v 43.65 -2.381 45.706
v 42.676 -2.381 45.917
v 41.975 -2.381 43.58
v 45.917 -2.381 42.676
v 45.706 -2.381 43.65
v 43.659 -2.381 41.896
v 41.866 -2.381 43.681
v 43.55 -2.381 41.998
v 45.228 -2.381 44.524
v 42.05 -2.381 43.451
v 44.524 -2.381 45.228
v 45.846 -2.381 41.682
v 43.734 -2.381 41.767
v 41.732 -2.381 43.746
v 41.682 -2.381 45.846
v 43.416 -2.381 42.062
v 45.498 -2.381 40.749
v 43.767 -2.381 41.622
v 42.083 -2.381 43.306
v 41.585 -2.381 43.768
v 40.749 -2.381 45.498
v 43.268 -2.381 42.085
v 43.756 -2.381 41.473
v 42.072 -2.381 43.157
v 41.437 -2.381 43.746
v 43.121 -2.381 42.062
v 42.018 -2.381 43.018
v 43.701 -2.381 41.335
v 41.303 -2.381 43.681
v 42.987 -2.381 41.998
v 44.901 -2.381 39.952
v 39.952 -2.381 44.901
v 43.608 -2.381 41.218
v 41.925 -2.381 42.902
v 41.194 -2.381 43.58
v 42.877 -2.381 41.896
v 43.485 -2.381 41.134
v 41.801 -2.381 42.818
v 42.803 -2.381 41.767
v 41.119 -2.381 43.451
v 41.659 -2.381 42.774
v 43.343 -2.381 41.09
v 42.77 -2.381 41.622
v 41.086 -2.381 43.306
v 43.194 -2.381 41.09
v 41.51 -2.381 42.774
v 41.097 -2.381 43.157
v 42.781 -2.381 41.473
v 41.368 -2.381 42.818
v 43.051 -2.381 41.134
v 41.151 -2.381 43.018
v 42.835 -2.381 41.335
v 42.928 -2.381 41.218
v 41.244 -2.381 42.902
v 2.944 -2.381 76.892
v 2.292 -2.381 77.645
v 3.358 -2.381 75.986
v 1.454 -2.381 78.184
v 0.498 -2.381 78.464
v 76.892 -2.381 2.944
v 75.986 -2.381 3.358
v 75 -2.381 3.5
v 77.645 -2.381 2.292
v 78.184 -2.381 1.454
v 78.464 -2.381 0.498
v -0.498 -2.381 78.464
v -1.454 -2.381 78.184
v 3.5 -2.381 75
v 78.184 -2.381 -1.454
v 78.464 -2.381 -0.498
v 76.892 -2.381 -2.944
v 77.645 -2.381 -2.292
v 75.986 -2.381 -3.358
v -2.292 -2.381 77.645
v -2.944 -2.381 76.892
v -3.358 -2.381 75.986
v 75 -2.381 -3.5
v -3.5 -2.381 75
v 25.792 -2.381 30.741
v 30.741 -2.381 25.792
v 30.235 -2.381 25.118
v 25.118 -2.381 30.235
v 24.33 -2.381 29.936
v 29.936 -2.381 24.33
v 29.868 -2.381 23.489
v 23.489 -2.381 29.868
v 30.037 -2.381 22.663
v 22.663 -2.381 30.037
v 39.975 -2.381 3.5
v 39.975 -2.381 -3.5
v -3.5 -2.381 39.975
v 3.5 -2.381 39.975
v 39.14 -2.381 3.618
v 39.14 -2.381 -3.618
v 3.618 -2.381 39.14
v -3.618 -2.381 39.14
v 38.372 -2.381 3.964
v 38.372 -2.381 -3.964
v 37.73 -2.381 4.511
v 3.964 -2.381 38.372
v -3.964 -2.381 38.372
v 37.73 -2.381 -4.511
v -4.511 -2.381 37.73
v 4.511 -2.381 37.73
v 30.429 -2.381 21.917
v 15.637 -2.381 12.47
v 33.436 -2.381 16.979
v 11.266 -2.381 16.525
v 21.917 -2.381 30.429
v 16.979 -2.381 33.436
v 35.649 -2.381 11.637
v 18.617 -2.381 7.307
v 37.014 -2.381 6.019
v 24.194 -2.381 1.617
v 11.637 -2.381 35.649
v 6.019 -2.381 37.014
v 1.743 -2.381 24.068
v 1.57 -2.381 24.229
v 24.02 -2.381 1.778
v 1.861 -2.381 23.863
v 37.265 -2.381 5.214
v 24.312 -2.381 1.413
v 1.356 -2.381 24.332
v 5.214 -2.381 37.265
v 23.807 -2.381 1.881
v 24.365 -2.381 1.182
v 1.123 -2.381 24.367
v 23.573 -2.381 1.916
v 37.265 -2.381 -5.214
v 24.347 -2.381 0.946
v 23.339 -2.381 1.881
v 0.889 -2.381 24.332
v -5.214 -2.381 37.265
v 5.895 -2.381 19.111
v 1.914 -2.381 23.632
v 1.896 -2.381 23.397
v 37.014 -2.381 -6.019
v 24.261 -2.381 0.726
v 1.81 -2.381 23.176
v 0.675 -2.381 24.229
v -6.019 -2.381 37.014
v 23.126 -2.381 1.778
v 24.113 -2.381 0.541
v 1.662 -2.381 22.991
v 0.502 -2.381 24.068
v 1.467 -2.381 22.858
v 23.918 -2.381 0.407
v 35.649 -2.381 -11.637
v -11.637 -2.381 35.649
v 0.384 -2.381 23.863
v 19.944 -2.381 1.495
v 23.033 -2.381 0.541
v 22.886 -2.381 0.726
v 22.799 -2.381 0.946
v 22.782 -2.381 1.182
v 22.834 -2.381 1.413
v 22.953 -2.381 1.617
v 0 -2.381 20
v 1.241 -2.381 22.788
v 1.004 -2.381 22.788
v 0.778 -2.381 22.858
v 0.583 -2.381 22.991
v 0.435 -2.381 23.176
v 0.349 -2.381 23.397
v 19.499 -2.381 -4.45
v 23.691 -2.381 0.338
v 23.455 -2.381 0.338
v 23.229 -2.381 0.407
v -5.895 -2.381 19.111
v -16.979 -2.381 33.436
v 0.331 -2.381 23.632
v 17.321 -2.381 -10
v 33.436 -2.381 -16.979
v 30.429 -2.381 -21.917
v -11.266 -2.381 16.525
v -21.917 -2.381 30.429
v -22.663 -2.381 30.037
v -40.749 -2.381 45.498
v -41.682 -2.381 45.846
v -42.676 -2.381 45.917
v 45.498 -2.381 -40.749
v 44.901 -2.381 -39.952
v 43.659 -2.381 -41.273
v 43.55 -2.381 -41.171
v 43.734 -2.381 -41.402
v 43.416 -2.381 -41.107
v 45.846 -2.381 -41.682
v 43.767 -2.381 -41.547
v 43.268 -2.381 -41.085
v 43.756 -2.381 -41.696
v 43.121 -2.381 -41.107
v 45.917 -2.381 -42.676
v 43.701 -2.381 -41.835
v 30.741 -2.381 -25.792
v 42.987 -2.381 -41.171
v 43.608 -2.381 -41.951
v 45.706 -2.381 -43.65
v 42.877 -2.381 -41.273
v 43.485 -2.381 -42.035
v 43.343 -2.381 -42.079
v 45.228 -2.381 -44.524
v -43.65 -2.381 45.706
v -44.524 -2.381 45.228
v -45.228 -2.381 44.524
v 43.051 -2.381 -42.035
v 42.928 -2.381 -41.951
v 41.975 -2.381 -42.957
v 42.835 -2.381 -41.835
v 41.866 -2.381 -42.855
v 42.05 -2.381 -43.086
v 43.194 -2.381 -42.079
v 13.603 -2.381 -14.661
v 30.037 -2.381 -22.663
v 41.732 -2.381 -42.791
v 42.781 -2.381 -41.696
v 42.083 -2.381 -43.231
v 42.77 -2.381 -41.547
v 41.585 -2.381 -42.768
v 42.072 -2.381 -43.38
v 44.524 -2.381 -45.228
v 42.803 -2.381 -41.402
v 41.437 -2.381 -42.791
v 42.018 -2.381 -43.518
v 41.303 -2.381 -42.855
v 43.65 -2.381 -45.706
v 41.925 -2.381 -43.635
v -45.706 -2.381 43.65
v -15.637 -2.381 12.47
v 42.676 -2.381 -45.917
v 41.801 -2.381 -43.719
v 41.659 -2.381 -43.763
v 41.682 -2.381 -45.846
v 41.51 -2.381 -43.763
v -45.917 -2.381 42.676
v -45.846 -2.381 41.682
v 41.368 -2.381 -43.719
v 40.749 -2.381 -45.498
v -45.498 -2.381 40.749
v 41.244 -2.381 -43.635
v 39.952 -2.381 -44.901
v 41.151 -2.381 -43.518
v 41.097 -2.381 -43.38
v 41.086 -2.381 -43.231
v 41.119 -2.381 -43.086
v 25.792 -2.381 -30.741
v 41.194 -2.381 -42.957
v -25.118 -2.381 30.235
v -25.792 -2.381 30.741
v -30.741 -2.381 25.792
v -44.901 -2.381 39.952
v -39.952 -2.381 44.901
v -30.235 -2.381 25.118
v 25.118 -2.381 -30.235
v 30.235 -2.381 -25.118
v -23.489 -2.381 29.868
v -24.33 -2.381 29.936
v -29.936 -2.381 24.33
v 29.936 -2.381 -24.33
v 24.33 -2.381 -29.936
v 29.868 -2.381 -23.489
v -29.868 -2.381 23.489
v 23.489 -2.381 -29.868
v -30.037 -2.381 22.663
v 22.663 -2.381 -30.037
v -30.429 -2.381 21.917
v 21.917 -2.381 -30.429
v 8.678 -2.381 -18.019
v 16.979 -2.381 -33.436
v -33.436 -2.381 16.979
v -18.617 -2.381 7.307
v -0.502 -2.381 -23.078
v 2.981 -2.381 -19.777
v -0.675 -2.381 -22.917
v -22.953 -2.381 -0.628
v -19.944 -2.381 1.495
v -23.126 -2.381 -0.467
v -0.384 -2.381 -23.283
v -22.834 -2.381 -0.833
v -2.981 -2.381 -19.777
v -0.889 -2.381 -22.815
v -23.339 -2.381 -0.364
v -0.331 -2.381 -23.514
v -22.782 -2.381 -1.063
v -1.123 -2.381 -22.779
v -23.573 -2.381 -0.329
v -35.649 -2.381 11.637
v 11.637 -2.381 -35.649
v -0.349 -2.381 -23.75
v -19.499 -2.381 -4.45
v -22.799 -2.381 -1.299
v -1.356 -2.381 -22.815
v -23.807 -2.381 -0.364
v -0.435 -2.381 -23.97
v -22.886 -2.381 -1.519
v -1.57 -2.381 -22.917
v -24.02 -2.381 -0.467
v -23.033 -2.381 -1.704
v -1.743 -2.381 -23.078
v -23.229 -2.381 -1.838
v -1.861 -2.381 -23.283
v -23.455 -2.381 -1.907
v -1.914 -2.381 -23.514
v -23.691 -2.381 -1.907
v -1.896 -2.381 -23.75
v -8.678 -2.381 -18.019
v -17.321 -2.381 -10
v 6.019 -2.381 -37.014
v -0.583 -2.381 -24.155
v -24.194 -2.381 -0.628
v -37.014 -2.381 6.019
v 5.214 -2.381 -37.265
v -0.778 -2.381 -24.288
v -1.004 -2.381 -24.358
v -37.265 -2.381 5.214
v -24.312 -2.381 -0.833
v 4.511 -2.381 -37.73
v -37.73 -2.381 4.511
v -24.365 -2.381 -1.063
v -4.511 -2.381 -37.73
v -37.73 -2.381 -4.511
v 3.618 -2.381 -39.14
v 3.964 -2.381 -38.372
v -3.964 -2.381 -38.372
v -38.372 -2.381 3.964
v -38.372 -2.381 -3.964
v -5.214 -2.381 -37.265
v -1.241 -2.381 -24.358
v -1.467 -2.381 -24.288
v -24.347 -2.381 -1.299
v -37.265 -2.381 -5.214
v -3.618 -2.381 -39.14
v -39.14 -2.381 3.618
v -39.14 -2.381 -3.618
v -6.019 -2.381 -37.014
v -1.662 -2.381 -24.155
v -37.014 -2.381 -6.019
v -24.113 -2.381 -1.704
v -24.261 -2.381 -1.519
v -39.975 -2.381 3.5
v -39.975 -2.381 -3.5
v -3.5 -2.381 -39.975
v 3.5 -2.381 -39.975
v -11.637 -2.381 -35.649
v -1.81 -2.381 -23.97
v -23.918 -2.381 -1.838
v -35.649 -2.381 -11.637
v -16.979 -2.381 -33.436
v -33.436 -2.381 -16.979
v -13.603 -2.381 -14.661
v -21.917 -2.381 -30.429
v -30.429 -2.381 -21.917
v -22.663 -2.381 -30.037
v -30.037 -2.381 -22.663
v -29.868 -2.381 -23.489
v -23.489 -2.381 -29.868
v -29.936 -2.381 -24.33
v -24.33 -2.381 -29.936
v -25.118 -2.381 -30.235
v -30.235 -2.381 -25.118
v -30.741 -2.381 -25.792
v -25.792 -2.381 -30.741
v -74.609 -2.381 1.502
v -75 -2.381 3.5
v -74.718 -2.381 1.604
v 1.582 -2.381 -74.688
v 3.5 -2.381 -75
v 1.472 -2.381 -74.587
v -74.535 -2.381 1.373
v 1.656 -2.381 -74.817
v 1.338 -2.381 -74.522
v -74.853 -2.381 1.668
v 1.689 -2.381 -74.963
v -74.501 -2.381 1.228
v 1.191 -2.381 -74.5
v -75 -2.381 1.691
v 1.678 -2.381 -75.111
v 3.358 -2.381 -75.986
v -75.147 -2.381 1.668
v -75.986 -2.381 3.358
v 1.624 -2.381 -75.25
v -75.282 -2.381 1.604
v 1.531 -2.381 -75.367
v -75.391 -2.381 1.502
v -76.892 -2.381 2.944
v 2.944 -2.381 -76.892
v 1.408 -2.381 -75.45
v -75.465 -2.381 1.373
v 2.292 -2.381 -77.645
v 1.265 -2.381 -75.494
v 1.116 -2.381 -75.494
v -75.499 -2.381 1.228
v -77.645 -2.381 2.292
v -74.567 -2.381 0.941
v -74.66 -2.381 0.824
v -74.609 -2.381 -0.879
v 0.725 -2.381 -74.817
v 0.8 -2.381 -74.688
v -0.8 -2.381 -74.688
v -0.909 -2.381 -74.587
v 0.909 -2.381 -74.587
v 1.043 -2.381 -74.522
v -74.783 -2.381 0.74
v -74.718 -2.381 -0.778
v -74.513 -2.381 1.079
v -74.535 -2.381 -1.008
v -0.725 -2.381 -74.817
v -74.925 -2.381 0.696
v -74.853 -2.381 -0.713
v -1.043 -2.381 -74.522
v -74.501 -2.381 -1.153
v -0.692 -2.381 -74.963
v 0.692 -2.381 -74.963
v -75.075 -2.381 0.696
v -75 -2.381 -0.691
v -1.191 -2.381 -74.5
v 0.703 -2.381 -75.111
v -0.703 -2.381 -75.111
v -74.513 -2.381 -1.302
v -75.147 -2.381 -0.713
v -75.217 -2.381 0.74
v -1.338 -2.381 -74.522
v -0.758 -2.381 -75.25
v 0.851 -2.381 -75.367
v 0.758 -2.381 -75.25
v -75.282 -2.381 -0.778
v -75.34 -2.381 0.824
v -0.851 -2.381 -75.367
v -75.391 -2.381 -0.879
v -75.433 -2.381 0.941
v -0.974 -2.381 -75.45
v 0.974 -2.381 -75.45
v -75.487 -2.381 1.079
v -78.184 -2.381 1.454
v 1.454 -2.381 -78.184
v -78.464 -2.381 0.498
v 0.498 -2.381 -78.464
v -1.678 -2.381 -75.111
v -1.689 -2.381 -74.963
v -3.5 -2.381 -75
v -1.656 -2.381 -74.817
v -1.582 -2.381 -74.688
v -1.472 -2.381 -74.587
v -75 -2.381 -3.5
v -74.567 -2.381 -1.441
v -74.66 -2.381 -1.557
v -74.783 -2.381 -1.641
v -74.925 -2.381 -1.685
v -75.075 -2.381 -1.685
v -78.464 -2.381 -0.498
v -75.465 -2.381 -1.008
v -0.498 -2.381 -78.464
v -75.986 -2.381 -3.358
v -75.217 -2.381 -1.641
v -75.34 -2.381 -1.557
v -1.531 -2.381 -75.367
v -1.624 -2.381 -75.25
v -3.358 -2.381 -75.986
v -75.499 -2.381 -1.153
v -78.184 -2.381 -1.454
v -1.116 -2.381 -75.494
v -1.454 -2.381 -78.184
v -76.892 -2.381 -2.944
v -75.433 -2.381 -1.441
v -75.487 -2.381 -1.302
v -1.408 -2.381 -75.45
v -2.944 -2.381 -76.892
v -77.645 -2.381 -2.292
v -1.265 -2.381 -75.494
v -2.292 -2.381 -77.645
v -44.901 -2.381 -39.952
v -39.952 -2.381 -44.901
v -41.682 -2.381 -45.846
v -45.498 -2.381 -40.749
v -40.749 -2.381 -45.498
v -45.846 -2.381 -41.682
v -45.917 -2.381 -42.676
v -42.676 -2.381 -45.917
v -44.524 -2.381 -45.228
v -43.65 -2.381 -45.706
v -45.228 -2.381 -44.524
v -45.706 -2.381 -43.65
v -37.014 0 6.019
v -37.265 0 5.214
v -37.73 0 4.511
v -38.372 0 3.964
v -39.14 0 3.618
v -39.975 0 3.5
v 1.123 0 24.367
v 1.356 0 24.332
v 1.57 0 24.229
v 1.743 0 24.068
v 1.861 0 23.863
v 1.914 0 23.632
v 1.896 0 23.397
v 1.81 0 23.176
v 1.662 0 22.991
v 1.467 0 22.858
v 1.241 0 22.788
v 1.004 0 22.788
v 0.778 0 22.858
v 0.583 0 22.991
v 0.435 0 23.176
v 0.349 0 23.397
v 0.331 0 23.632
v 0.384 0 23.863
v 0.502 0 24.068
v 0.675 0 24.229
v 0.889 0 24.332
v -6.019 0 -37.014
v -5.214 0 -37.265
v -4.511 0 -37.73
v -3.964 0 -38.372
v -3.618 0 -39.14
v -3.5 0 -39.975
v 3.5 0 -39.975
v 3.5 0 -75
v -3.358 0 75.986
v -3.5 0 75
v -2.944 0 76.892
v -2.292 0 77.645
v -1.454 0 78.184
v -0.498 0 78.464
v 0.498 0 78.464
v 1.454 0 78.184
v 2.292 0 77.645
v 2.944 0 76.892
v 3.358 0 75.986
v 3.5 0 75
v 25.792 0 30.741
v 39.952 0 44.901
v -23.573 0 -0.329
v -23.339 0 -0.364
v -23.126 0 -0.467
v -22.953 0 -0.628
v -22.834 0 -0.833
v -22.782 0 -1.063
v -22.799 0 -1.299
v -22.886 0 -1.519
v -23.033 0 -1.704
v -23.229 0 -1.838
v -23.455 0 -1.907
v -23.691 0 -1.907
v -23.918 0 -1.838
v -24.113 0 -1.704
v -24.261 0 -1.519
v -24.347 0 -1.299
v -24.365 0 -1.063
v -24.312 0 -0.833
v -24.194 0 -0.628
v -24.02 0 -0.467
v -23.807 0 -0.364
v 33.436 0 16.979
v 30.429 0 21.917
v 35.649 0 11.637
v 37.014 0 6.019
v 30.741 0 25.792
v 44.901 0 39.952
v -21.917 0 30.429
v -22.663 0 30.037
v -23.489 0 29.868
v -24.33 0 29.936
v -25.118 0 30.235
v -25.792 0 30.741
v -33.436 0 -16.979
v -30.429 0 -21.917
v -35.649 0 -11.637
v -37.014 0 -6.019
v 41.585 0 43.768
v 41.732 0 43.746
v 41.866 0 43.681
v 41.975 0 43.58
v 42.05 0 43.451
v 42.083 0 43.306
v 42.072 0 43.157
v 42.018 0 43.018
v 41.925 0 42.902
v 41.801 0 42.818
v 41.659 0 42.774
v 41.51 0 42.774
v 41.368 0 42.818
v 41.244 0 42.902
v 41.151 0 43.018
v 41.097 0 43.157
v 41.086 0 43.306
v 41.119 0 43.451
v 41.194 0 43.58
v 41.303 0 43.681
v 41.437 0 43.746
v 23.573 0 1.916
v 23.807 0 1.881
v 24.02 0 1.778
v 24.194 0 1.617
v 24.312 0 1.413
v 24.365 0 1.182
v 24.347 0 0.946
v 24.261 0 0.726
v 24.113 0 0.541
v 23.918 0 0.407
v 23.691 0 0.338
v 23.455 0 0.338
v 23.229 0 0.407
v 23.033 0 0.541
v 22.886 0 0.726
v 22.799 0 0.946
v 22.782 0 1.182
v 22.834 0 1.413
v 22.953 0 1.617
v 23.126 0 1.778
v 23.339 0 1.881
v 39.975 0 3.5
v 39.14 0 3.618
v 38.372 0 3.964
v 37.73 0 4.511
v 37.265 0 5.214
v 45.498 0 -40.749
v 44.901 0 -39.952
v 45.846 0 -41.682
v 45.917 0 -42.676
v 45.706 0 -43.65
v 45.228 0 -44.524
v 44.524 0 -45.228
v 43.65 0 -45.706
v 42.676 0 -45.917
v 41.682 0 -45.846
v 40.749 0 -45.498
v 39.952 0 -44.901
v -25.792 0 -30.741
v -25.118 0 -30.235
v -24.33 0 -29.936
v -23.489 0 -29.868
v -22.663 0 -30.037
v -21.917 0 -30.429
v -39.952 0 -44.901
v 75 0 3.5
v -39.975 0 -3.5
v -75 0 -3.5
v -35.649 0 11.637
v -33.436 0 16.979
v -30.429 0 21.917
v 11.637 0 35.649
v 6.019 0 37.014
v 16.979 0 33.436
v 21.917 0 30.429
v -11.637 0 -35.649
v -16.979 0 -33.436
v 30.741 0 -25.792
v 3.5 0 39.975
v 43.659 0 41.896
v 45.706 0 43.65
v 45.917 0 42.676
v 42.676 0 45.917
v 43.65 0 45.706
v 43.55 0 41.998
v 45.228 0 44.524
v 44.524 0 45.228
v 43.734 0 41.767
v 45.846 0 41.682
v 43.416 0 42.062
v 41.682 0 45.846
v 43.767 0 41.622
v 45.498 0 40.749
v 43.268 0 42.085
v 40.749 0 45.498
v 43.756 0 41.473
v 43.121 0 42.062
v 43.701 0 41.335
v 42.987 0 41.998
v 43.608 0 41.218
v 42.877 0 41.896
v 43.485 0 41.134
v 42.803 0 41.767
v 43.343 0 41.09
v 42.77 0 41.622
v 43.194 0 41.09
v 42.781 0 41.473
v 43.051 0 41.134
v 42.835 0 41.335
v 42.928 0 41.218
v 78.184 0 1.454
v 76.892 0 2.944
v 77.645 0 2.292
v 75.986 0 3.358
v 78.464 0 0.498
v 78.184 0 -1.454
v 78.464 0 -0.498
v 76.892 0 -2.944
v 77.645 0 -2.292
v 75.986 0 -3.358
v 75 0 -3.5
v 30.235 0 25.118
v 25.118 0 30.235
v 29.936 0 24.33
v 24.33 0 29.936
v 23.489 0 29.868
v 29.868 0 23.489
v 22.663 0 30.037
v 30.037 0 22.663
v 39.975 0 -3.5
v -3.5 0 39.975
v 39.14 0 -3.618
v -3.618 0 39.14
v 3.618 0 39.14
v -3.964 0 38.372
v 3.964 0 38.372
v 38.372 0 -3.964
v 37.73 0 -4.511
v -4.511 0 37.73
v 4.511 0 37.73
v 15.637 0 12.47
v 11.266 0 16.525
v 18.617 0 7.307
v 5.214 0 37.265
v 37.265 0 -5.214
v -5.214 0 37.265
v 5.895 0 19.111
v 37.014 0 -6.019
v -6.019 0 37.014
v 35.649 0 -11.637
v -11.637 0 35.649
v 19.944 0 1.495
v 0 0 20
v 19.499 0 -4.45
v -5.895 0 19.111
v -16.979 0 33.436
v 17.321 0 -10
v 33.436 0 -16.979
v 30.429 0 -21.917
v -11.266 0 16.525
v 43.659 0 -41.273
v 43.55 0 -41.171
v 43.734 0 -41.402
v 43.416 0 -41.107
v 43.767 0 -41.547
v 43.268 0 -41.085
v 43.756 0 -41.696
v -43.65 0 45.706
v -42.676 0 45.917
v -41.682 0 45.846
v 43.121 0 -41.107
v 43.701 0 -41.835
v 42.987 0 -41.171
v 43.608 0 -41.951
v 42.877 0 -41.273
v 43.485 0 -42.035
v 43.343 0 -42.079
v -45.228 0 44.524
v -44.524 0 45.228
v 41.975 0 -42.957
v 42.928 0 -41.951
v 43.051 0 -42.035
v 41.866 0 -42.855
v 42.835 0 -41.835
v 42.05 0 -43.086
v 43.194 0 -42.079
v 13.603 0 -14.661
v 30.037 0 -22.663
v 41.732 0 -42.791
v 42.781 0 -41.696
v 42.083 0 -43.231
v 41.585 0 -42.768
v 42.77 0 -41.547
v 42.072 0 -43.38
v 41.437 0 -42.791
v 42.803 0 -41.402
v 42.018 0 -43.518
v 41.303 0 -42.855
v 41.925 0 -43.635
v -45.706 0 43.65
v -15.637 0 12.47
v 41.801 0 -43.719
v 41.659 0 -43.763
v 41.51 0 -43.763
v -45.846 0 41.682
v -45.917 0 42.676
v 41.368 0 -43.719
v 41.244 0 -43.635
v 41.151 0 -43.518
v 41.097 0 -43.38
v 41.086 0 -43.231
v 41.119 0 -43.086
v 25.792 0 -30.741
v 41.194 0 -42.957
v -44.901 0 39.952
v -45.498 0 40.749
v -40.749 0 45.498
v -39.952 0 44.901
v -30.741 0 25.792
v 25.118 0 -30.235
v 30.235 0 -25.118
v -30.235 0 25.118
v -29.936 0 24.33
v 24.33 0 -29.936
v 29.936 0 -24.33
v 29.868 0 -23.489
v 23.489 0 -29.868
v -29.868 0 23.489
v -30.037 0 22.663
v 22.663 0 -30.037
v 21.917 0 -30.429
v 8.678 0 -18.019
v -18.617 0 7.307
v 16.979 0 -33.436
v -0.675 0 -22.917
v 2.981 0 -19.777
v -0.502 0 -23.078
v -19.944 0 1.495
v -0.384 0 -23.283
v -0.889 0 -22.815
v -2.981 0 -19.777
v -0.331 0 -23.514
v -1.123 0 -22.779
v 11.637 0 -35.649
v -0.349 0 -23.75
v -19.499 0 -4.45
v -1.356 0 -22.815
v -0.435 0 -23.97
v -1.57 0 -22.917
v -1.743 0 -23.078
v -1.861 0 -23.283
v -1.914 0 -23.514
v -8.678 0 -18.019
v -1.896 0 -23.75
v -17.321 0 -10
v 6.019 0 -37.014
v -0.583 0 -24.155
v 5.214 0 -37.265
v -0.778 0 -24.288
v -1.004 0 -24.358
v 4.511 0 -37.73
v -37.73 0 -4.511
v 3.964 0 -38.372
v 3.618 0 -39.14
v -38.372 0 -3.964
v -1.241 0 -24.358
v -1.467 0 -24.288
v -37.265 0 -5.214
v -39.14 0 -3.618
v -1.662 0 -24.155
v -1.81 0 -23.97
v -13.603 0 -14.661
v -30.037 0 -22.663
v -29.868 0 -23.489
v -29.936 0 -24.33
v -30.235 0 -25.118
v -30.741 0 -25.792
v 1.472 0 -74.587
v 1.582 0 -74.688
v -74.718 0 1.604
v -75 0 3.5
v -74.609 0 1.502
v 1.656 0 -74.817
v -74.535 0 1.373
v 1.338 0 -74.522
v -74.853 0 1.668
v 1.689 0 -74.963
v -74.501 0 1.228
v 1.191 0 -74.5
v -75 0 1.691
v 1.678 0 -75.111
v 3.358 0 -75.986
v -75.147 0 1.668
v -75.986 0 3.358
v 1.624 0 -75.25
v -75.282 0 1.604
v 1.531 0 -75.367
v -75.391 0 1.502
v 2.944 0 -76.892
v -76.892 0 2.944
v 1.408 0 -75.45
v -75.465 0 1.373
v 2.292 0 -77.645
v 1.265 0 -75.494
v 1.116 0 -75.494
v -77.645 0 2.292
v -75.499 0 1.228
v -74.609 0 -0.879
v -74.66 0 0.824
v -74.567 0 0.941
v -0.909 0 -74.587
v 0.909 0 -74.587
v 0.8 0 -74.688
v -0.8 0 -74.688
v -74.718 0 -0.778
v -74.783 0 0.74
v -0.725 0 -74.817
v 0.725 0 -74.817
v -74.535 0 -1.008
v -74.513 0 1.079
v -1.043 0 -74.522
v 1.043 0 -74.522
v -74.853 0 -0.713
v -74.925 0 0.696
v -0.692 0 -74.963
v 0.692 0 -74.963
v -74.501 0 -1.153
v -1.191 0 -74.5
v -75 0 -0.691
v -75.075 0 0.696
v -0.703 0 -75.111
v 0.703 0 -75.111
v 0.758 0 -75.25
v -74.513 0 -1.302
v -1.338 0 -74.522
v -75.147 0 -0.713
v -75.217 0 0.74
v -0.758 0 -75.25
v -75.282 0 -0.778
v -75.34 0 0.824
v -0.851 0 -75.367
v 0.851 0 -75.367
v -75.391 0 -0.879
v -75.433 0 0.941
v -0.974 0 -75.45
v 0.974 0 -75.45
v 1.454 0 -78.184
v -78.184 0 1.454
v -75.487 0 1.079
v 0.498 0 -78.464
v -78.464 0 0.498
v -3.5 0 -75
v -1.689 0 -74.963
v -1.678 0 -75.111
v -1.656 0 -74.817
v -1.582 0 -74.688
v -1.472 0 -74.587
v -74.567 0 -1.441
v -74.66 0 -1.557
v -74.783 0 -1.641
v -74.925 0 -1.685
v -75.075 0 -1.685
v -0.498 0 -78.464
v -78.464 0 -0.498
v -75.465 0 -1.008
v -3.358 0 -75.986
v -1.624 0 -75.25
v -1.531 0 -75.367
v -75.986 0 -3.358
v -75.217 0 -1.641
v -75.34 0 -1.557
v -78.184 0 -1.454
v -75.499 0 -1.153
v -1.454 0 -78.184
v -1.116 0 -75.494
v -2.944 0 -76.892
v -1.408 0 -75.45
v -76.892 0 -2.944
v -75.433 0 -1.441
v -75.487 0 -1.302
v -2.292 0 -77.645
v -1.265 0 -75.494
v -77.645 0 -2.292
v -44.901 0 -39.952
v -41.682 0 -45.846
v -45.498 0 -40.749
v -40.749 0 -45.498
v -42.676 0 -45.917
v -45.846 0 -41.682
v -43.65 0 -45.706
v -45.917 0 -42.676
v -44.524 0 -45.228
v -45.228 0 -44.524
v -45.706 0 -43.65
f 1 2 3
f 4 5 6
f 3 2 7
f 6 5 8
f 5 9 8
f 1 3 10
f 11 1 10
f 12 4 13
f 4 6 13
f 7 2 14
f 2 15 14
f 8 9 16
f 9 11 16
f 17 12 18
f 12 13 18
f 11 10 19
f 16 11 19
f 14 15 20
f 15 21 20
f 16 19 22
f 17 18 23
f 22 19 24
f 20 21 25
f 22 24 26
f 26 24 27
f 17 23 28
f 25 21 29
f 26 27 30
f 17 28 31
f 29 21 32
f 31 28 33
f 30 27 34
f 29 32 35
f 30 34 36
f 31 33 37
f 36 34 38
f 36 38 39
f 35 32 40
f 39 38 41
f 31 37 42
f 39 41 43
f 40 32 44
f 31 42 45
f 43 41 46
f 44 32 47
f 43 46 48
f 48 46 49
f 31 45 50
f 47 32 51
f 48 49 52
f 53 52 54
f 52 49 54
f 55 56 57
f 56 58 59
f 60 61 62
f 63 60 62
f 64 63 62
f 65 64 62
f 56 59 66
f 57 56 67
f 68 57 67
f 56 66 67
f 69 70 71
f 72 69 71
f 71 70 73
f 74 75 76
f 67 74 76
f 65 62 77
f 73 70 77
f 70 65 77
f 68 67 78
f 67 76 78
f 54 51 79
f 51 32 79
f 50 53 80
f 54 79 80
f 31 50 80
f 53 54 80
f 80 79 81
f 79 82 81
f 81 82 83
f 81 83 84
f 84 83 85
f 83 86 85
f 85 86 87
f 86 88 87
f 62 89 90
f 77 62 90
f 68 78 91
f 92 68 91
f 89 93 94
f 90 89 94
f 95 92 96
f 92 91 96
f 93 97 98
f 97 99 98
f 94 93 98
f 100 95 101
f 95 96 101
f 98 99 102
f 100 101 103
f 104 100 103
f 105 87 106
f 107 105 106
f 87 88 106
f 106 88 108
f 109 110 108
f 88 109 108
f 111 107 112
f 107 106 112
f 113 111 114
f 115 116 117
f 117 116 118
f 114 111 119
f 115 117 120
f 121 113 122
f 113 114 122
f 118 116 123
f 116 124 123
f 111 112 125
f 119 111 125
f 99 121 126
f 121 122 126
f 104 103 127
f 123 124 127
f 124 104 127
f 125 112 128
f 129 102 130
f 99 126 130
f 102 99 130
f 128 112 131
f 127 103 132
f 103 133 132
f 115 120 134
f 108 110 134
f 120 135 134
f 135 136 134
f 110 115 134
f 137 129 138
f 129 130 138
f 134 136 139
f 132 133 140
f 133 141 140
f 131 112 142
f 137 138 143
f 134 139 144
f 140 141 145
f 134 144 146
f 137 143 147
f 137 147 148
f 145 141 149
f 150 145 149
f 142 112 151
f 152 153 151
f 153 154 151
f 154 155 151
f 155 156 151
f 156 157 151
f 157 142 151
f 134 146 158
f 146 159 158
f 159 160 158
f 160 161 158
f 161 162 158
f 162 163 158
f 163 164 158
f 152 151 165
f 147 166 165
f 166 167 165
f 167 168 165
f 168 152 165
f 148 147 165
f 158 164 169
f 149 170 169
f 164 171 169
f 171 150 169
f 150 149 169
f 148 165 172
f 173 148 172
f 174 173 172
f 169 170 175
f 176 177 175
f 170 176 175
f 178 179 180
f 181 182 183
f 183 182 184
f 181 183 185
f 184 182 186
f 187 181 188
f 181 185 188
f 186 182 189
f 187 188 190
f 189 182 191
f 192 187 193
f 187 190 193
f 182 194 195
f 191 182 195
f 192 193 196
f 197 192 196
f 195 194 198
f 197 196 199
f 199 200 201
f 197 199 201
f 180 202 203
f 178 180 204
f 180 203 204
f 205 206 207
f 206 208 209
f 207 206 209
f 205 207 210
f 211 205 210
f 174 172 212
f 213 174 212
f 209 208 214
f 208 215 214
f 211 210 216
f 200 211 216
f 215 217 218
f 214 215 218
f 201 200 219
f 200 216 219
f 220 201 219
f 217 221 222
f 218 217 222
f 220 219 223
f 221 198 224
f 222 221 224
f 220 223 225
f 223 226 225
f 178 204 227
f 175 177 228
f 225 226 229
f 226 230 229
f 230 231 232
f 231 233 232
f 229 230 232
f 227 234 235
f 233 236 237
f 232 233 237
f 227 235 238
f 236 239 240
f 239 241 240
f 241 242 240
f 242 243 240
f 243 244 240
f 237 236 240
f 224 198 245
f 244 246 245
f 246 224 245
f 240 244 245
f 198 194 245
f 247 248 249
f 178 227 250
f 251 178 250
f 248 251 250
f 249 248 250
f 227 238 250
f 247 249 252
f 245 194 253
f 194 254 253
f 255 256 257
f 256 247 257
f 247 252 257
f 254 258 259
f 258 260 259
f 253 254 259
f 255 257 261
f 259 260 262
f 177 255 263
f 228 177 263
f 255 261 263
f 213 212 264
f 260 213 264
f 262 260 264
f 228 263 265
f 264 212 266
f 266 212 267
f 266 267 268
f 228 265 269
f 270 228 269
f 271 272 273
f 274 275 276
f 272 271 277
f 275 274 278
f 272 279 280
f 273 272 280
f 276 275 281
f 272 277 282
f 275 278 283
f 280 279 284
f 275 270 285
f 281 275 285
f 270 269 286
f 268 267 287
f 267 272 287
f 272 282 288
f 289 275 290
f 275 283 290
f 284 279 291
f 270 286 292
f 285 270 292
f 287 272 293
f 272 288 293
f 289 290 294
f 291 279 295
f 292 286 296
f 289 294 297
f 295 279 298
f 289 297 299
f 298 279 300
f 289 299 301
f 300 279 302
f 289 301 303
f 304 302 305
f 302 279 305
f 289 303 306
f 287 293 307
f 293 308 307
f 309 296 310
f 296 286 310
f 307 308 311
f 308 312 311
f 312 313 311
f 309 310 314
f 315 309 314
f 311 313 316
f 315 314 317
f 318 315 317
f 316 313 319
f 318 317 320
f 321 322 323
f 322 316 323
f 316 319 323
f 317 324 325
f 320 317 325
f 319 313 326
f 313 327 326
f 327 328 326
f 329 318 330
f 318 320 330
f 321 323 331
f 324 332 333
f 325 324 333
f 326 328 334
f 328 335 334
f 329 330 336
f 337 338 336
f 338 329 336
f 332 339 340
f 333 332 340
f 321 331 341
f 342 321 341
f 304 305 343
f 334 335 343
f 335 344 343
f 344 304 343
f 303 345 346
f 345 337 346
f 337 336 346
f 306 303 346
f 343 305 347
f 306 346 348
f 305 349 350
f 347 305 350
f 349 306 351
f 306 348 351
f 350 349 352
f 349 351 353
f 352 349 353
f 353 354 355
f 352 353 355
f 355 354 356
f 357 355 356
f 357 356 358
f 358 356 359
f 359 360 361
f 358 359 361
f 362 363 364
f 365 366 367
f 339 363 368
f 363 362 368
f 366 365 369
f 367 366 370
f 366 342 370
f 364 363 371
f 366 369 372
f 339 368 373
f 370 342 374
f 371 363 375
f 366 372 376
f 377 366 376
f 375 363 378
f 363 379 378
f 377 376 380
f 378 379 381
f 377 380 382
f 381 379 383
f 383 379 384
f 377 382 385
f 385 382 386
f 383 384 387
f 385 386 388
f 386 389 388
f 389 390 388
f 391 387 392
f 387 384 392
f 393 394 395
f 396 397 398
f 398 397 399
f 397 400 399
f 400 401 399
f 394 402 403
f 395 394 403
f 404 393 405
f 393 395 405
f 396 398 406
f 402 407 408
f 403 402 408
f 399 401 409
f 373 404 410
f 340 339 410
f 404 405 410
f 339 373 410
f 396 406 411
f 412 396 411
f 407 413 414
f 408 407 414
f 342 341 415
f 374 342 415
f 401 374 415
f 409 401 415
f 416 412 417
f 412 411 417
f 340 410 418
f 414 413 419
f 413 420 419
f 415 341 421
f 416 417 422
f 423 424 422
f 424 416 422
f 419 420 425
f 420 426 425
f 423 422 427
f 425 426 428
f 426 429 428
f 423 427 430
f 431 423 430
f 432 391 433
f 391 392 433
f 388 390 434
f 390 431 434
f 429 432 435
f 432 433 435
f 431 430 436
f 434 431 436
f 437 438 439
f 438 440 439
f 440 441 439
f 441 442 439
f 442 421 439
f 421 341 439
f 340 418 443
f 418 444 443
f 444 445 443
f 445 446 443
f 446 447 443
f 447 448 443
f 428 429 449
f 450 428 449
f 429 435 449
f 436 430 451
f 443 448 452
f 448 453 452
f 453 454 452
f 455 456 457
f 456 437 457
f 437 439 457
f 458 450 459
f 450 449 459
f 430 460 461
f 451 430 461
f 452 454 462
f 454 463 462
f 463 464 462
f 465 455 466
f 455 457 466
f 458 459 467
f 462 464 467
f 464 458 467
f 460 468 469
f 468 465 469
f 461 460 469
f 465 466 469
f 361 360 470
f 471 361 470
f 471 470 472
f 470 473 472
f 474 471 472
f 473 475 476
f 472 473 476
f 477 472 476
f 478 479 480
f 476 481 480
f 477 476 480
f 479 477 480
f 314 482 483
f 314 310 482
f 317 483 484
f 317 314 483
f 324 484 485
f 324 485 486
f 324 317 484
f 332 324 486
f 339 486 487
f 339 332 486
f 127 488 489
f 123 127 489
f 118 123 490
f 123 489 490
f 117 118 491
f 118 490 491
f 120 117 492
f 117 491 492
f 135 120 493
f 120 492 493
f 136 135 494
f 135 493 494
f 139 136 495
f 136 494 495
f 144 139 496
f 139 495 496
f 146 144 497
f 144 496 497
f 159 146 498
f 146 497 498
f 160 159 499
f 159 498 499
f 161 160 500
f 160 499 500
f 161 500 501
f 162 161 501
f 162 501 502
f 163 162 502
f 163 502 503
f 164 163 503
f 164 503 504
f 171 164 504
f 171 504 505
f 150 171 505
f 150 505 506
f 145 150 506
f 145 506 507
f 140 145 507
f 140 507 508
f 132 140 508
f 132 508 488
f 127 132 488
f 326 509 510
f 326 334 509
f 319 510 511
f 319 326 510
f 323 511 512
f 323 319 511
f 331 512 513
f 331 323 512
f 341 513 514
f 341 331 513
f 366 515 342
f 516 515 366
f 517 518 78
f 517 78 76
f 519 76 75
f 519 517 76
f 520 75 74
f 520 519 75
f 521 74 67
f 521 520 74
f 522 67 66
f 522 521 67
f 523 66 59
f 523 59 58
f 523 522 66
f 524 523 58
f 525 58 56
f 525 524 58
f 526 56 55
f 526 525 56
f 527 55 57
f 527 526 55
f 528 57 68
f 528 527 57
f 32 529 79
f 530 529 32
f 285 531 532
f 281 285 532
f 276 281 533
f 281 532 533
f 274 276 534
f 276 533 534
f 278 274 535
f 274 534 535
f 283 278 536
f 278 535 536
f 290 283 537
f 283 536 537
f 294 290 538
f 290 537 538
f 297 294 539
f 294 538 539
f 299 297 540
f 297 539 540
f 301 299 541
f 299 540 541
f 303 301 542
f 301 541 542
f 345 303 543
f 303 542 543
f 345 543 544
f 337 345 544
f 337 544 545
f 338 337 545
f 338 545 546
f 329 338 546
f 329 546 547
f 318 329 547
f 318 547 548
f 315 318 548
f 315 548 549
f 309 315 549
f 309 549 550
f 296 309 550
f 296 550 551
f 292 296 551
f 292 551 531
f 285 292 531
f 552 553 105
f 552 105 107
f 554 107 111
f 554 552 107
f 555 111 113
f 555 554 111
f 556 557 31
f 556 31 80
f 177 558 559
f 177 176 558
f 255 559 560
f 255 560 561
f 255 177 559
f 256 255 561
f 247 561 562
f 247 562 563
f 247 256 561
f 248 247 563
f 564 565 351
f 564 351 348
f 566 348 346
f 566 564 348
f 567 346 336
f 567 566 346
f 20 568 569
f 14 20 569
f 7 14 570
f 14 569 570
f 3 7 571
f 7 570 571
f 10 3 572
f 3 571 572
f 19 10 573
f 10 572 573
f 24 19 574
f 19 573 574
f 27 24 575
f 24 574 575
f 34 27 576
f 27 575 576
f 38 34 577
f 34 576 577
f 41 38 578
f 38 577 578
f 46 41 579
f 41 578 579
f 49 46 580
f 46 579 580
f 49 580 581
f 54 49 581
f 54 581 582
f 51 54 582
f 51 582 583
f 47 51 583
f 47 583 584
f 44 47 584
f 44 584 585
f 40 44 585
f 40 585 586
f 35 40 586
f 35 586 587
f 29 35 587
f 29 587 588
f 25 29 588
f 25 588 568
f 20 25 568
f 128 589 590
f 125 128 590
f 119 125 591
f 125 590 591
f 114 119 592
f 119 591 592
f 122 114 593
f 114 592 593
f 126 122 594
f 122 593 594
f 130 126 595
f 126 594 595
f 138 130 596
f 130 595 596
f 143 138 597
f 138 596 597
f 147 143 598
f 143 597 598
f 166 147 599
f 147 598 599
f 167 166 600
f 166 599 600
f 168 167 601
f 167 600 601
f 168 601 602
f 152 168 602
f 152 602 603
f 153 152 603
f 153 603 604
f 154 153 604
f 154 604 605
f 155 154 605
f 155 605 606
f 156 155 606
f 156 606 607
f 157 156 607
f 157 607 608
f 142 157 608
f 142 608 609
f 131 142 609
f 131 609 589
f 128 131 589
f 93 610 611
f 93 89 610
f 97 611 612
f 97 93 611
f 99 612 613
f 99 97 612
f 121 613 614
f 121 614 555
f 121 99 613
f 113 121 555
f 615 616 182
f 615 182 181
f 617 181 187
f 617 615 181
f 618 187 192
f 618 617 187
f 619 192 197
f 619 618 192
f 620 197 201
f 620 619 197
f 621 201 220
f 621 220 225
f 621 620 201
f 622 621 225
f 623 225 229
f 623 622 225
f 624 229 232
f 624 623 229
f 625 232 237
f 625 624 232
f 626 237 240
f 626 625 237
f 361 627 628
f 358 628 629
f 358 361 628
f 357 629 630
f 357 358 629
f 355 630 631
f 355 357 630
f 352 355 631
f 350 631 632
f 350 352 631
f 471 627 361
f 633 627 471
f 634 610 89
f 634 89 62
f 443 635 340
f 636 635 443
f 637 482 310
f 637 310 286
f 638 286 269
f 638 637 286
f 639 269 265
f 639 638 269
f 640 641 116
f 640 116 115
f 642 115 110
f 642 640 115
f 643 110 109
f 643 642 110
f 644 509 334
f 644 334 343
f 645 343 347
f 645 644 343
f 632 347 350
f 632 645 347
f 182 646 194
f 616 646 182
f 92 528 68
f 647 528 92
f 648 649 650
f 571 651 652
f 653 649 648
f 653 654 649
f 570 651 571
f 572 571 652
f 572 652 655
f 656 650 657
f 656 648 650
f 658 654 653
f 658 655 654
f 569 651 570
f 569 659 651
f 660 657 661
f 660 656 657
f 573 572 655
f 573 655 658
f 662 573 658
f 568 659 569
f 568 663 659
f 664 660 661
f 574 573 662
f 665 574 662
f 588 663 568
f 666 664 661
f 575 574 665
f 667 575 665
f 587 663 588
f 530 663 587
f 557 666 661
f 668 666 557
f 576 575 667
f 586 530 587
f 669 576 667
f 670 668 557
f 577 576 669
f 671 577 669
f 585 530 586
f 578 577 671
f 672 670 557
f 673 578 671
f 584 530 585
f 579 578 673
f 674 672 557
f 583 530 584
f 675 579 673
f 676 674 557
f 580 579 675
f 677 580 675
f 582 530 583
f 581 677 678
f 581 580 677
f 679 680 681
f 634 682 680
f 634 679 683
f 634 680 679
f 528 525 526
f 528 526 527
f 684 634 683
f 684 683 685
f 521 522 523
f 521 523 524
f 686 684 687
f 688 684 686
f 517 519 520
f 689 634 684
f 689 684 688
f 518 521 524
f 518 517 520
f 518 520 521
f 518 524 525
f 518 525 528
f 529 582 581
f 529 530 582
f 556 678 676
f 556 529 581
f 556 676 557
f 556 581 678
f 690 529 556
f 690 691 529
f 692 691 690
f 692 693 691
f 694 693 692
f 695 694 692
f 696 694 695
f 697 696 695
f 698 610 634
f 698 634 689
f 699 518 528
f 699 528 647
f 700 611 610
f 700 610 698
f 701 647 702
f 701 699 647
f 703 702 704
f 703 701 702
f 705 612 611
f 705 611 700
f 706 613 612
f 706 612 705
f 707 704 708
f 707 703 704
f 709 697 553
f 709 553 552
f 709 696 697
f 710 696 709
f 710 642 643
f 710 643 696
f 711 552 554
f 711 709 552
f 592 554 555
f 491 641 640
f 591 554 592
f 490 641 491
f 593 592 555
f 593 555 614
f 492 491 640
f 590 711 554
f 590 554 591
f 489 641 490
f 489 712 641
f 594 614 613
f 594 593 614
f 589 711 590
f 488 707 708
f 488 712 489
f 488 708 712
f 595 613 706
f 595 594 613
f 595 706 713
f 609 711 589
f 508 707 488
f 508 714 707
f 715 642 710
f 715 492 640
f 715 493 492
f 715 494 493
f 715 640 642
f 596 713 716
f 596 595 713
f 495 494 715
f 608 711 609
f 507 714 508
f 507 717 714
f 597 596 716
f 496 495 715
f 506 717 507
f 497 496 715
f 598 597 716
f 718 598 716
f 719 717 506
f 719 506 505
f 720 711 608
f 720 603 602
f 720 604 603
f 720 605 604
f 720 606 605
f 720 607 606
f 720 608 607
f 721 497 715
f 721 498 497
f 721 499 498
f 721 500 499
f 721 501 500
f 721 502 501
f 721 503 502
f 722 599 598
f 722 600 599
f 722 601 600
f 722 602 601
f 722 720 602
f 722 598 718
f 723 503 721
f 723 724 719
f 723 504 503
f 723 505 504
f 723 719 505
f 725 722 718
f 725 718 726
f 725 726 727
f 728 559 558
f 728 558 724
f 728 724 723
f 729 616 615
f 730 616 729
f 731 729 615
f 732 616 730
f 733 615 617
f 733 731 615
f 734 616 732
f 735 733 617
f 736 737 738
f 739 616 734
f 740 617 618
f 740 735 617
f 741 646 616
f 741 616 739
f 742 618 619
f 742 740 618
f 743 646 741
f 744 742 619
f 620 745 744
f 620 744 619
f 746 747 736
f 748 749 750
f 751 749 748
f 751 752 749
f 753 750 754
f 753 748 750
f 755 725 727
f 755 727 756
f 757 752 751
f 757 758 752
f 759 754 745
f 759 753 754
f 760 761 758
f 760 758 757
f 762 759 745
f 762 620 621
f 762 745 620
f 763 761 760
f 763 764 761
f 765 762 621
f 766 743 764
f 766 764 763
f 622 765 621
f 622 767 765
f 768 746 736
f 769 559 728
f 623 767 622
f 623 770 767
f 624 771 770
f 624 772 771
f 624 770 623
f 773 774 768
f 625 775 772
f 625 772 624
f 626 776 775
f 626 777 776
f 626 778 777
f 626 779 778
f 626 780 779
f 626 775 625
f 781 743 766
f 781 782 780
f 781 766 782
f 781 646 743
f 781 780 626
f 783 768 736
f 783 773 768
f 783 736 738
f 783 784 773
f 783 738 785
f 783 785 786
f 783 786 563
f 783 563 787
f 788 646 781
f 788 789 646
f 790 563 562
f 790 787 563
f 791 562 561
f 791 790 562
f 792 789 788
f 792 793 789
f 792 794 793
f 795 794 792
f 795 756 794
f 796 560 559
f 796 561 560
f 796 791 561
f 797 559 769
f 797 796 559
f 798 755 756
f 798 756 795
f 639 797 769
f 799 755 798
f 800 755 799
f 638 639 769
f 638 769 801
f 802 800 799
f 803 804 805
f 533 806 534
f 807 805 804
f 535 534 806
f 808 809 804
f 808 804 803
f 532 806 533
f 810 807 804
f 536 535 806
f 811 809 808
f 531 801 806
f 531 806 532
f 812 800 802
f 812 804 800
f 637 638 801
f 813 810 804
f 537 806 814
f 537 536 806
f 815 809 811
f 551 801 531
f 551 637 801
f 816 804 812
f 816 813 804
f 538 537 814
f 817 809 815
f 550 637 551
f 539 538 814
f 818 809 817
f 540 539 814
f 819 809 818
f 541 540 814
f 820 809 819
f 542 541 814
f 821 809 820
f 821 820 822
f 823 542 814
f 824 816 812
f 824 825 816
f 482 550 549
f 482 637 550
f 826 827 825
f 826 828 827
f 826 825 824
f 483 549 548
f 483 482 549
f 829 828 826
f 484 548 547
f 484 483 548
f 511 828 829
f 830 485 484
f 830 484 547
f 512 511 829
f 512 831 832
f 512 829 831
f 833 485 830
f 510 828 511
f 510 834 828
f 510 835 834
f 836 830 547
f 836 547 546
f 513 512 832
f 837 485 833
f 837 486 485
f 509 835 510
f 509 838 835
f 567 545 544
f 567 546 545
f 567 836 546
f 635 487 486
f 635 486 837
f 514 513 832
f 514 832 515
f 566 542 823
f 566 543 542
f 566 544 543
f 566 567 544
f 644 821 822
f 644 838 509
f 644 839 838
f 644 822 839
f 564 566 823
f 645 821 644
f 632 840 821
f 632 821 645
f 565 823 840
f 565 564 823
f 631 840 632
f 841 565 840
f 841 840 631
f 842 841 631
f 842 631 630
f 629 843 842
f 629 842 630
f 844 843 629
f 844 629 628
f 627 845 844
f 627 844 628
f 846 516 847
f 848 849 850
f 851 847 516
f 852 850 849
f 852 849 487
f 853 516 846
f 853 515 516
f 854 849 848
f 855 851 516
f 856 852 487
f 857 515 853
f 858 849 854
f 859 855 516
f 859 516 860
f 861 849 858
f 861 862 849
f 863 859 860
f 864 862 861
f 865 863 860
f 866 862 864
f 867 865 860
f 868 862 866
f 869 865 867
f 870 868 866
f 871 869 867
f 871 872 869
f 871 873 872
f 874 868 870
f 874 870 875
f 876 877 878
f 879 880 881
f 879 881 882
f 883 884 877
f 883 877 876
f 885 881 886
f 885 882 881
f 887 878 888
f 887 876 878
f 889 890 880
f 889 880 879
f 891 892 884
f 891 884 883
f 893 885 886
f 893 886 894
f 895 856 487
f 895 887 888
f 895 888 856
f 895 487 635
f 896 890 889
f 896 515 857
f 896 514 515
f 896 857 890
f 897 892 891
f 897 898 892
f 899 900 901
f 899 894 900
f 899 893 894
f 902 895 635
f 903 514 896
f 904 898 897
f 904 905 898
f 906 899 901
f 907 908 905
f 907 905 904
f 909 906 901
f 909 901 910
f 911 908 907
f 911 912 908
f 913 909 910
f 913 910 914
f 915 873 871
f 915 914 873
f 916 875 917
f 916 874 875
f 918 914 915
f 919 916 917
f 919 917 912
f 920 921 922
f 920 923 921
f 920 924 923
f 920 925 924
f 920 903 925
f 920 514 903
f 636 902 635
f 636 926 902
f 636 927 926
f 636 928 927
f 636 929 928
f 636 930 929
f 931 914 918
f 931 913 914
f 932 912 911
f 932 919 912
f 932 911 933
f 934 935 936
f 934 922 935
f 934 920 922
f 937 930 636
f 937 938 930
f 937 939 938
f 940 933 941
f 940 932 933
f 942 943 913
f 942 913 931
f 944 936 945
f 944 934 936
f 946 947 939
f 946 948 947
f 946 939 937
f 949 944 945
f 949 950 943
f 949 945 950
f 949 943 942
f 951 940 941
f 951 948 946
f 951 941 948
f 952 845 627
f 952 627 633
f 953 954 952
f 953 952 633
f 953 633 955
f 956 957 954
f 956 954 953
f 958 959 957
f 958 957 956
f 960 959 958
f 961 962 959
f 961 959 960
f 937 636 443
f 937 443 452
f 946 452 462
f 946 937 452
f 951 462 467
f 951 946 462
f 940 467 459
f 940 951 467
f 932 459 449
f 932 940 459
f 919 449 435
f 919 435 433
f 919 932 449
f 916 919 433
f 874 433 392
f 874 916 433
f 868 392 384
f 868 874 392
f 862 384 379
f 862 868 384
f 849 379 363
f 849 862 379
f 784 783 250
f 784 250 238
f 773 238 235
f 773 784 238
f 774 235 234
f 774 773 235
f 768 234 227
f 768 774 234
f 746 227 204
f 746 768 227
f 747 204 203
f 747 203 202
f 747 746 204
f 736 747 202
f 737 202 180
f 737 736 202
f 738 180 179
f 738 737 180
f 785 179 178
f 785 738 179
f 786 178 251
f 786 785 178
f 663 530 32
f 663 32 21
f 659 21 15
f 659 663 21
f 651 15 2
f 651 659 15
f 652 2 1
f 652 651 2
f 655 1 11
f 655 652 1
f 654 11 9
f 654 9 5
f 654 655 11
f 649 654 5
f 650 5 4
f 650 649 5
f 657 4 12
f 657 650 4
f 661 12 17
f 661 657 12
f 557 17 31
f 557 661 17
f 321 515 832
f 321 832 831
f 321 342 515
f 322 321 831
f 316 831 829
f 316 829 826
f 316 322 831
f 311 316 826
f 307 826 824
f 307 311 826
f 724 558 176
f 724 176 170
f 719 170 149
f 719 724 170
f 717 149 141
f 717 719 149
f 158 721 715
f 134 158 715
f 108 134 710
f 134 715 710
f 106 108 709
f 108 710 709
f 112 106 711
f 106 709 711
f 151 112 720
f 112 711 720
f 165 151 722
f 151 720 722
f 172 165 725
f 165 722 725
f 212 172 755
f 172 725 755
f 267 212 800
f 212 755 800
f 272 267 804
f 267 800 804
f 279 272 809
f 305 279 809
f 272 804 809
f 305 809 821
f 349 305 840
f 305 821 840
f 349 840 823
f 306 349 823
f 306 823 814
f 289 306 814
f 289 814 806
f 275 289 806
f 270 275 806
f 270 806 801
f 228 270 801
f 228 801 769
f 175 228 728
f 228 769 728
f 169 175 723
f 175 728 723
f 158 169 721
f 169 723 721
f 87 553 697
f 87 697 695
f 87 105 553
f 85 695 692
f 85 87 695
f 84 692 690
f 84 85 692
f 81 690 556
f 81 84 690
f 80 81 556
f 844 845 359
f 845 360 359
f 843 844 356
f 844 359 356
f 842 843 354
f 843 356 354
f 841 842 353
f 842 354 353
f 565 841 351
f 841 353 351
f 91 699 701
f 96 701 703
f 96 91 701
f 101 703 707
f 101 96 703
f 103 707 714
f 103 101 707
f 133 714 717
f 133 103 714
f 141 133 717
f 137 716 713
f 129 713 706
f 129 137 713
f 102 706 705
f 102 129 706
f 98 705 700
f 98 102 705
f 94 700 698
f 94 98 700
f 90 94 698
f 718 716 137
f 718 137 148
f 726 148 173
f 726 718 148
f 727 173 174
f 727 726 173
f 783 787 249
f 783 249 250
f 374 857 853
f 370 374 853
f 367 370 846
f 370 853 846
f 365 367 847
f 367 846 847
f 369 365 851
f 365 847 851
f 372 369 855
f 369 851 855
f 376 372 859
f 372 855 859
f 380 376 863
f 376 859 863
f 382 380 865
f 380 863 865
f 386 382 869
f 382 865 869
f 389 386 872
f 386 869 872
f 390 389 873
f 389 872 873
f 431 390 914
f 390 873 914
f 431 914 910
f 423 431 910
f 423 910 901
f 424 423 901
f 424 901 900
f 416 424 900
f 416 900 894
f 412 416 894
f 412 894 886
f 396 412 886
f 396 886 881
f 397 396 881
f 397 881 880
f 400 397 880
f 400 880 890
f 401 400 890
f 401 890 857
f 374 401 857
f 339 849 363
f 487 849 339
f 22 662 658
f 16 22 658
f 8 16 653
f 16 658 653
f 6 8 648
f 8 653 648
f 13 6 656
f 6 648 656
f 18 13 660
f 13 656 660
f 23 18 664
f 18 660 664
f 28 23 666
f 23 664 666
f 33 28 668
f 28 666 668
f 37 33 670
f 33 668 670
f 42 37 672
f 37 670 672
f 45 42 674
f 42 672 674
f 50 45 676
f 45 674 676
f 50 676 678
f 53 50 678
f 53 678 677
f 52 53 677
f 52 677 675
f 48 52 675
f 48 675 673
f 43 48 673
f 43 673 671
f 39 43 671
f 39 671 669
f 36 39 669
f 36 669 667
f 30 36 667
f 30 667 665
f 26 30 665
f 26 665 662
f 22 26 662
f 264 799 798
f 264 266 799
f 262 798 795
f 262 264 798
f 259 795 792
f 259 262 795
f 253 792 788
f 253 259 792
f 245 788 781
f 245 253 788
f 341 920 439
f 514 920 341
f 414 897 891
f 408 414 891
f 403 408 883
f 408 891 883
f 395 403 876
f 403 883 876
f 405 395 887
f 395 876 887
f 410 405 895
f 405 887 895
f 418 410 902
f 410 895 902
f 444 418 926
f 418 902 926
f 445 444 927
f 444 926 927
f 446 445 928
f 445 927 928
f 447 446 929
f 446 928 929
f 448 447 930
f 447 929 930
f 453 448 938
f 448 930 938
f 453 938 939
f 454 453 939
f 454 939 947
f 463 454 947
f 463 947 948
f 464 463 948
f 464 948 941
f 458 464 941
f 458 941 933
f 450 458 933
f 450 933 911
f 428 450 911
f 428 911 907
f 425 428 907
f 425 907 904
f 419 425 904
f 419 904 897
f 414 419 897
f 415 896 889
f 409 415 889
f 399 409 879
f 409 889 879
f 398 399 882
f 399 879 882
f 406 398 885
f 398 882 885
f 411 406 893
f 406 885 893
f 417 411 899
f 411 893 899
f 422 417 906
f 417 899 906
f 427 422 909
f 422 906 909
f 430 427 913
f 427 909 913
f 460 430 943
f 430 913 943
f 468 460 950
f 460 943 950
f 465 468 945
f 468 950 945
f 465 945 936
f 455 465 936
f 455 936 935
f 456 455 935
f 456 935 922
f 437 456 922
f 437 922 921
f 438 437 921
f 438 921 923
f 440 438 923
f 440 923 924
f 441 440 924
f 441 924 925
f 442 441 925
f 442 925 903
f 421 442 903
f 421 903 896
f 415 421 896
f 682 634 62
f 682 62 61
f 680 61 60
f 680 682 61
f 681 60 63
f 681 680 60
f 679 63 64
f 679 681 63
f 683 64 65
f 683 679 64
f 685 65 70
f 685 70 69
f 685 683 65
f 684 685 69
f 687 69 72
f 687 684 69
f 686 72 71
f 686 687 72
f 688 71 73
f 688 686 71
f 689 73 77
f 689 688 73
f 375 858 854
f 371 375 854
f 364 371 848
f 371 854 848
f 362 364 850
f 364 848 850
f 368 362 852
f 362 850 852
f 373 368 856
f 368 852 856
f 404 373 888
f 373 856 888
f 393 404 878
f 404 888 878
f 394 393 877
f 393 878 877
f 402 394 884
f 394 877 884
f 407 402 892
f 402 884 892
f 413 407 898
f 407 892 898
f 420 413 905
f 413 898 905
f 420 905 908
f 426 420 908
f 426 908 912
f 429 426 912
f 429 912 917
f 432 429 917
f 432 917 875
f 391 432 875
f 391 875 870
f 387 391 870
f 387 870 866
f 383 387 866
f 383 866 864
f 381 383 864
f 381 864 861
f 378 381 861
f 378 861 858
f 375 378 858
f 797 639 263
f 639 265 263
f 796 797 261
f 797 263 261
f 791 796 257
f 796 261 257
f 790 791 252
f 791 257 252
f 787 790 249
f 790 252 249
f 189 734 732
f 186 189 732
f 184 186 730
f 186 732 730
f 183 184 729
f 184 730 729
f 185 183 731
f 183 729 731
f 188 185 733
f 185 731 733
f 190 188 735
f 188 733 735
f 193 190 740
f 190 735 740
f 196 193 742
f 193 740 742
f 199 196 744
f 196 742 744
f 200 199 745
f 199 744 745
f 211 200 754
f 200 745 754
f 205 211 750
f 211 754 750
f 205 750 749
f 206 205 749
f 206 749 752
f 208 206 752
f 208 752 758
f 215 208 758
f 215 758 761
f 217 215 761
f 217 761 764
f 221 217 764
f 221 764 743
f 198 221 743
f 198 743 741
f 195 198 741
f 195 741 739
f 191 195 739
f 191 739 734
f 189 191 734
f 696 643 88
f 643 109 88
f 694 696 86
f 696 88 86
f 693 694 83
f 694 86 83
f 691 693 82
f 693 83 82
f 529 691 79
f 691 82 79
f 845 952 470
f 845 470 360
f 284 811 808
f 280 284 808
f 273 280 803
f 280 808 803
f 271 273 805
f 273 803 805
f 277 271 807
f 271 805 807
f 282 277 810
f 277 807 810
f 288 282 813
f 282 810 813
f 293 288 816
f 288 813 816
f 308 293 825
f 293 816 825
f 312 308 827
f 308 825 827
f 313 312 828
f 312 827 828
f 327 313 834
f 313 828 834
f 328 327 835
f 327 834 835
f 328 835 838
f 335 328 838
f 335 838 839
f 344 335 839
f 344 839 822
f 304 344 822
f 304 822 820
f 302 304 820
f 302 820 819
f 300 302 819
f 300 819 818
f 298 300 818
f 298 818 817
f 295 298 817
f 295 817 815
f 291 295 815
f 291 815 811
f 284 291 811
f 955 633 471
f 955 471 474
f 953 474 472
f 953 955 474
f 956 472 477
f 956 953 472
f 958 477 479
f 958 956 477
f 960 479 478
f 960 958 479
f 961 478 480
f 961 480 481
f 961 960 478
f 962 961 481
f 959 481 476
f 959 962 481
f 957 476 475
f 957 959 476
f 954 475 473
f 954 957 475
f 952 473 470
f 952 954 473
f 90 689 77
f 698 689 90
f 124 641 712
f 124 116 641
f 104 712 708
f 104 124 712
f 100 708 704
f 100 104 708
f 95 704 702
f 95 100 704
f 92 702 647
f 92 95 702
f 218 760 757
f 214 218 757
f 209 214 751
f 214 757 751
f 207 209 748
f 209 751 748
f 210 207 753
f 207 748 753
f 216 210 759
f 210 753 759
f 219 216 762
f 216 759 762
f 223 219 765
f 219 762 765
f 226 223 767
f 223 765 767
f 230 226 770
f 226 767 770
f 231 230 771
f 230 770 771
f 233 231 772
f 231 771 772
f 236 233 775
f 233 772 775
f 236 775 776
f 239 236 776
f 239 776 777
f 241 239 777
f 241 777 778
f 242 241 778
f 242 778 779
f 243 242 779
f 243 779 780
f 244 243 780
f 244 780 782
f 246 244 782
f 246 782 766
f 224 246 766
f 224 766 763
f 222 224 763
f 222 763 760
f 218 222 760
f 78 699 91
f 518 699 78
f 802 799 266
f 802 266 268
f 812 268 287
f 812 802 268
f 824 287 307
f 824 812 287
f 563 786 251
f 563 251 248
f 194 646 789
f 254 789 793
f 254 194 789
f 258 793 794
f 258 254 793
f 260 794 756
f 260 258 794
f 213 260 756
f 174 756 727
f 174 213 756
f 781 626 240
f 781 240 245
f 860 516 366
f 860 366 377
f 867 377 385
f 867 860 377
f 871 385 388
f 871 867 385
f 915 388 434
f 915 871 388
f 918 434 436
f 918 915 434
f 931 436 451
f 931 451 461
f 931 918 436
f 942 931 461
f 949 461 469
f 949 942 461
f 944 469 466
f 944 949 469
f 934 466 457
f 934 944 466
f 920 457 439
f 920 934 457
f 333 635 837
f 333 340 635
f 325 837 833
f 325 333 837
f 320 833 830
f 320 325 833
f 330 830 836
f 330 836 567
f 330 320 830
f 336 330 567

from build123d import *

# Parameters (mm, degrees)
SKETCH1_R                = 37.5
SKETCH1_R_2              = 20
BASE_FLANGE1_DEPTH       = 2.38125
BOSS_EXTRUDE1_DEPTH      = 2.38125
BOSS_EXTRUDE2_DEPTH      = 2.38125
FILLET1_R                = 3
CIRPATTERN1_COUNT        = 4
FILLET1_OF_CIRPATTERN1_R = 3
SKETCH7_R                = 0.5
CUT_EXTRUDE1_DEPTH       = 112.041300207
SKETCH10_R               = 0.79375
CUT_EXTRUDE2_DEPTH       = 112.041300207


# Sheet-metal steps are written as plain solids
with BuildPart() as part:
    # Sketch1 → Base-Flange1 (new body)
    with BuildSketch(Plane(origin=(0, 0, 0), x_dir=(1, 0, 0), z_dir=(0, 1, 0))):
        with Locations(Location((0, 0, 0), (0, 0, 270))):
            Circle(SKETCH1_R)
        with Locations(Location((0, 0, 0), (0, 0, 270))):
            Circle(SKETCH1_R_2, mode=Mode.SUBTRACT)
    extrude(amount=-BASE_FLANGE1_DEPTH)

    # Sketch6 → Boss-Extrude1 (add)
    with BuildSketch(Plane(origin=(0, 0, 0), x_dir=(1, 0, 0), z_dir=(0, 1, 0))):
        with BuildLine():
            Line((-3.5, 75), (-3.5, 37.336309405))
            Line((-3.5, 37.336309405), (3.5, 37.336309405))
            Line((3.5, 37.336309405), (3.5, 75))
            ThreePointArc((3.5, 75), (0, 78.5), (-3.5, 75))
        make_face()
    boss_extrude1 = extrude(amount=-BOSS_EXTRUDE1_DEPTH)

    # Sketch9 → Boss-Extrude2 (add)
    with BuildSketch(Plane(origin=(0, 0, 0), x_dir=(1, 0, 0), z_dir=(0, 1, 0))):
        with BuildLine():
            Line((23.925883831, 28.875631299), (28.875631299, 23.925883831))
            Line((28.875631299, 23.925883831), (44.901280605, 39.951533137))
            ThreePointArc((44.901280605, 39.951533137), (44.901280605, 44.901280605), (39.951533137, 44.901280605))
            Line((39.951533137, 44.901280605), (23.925883831, 28.875631299))
        make_face()
    boss_extrude2 = extrude(amount=-BOSS_EXTRUDE2_DEPTH)

    # Fillet1
    fillet1_edges = [part.edges().sort_by_distance(p)[0] for p in [
        (3.5, -1.190625, -37.336309405),
        (-3.5, -1.190625, -37.336309405),
        (23.925883831, -1.190625, -28.875631299),
        (28.875631299, -1.190625, -23.925883831),
    ]]
    fillet(fillet1_edges, radius=FILLET1_R)

    # CirPattern1: Boss-Extrude1, Boss-Extrude2 ×4 about axis
    cirpattern1_axis = Axis((0, 0, 0), (0, 1, 0))
    add([boss_extrude1.rotate(cirpattern1_axis, i * 360 / CIRPATTERN1_COUNT) for i in range(1, CIRPATTERN1_COUNT)])
    add([boss_extrude2.rotate(cirpattern1_axis, i * 360 / CIRPATTERN1_COUNT) for i in range(1, CIRPATTERN1_COUNT)])

    # Fillet1 of CirPattern1
    fillet1_of_cirpattern1_edges = [part.edges().sort_by_distance(p)[0] for p in [
        (-37.336309405, -1.190625, -3.5),
        (-37.336309405, -1.190625, 3.5),
        (-28.875631299, -1.190625, -23.925883831),
        (-23.925883831, -1.190625, -28.875631299),
        (-3.5, -1.190625, 37.336309405),
        (3.5, -1.190625, 37.336309405),
        (-23.925883831, -1.190625, 28.875631299),
        (-28.875631299, -1.190625, 23.925883831),
        (37.336309405, -1.190625, 3.5),
        (37.336309405, -1.190625, -3.5),
        (28.875631299, -1.190625, 23.925883831),
        (23.925883831, -1.190625, 28.875631299),
    ]]
    fillet(fillet1_of_cirpattern1_edges, radius=FILLET1_OF_CIRPATTERN1_R)

    # Sketch7 → Cut-Extrude1 (cut, through all)
    with BuildSketch(Plane(origin=(0, 0, 0), x_dir=(1, 0, 0), z_dir=(0, 1, 0))):
        with Locations(Location((-1.190625, 75, 0), (0, 0, 270))):
            Circle(SKETCH7_R)
        with Locations(Location((1.190625, 75, 0), (0, 0, 270))):
            Circle(SKETCH7_R)
        with Locations(Location((41.58450786, 43.268305883, 0), (0, 0, 270))):
            Circle(SKETCH7_R)
        with Locations(Location((43.268305883, 41.58450786, 0), (0, 0, 270))):
            Circle(SKETCH7_R)
        with Locations(Location((-75, -1.190625, 0), (0, 0, 270))):
            Circle(SKETCH7_R)
        with Locations(Location((-75, 1.190625, 0), (0, 0, 270))):
            Circle(SKETCH7_R)
        with Locations(Location((43.268305883, -41.58450786, 0), (0, 0, 270))):
            Circle(SKETCH7_R)
        with Locations(Location((41.58450786, -43.268305883, 0), (0, 0, 270))):
            Circle(SKETCH7_R)
    extrude(amount=-CUT_EXTRUDE1_DEPTH, mode=Mode.SUBTRACT)

    # Sketch10 → Cut-Extrude2 (cut, through all)
    with BuildSketch(Plane(origin=(0, 0, 0), x_dir=(1, 0, 0), z_dir=(0, 1, 0))):
        with Locations(Location((-23.573172318, 1.122532015, 0), (0, 0, 270))):
            Circle(SKETCH10_R)
        with Locations(Location((-1.122532015, 23.573172318, 0), (0, 0, 270))):
            Circle(SKETCH10_R)
        with Locations(Location((23.573172318, -1.122532015, 0), (0, 0, 270))):
            Circle(SKETCH10_R)
        with Locations(Location((1.122532015, -23.573172318, 0), (0, 0, 270))):
            Circle(SKETCH10_R)
    extrude(amount=-CUT_EXTRUDE2_DEPTH, mode=Mode.SUBTRACT)


solid = part.part
